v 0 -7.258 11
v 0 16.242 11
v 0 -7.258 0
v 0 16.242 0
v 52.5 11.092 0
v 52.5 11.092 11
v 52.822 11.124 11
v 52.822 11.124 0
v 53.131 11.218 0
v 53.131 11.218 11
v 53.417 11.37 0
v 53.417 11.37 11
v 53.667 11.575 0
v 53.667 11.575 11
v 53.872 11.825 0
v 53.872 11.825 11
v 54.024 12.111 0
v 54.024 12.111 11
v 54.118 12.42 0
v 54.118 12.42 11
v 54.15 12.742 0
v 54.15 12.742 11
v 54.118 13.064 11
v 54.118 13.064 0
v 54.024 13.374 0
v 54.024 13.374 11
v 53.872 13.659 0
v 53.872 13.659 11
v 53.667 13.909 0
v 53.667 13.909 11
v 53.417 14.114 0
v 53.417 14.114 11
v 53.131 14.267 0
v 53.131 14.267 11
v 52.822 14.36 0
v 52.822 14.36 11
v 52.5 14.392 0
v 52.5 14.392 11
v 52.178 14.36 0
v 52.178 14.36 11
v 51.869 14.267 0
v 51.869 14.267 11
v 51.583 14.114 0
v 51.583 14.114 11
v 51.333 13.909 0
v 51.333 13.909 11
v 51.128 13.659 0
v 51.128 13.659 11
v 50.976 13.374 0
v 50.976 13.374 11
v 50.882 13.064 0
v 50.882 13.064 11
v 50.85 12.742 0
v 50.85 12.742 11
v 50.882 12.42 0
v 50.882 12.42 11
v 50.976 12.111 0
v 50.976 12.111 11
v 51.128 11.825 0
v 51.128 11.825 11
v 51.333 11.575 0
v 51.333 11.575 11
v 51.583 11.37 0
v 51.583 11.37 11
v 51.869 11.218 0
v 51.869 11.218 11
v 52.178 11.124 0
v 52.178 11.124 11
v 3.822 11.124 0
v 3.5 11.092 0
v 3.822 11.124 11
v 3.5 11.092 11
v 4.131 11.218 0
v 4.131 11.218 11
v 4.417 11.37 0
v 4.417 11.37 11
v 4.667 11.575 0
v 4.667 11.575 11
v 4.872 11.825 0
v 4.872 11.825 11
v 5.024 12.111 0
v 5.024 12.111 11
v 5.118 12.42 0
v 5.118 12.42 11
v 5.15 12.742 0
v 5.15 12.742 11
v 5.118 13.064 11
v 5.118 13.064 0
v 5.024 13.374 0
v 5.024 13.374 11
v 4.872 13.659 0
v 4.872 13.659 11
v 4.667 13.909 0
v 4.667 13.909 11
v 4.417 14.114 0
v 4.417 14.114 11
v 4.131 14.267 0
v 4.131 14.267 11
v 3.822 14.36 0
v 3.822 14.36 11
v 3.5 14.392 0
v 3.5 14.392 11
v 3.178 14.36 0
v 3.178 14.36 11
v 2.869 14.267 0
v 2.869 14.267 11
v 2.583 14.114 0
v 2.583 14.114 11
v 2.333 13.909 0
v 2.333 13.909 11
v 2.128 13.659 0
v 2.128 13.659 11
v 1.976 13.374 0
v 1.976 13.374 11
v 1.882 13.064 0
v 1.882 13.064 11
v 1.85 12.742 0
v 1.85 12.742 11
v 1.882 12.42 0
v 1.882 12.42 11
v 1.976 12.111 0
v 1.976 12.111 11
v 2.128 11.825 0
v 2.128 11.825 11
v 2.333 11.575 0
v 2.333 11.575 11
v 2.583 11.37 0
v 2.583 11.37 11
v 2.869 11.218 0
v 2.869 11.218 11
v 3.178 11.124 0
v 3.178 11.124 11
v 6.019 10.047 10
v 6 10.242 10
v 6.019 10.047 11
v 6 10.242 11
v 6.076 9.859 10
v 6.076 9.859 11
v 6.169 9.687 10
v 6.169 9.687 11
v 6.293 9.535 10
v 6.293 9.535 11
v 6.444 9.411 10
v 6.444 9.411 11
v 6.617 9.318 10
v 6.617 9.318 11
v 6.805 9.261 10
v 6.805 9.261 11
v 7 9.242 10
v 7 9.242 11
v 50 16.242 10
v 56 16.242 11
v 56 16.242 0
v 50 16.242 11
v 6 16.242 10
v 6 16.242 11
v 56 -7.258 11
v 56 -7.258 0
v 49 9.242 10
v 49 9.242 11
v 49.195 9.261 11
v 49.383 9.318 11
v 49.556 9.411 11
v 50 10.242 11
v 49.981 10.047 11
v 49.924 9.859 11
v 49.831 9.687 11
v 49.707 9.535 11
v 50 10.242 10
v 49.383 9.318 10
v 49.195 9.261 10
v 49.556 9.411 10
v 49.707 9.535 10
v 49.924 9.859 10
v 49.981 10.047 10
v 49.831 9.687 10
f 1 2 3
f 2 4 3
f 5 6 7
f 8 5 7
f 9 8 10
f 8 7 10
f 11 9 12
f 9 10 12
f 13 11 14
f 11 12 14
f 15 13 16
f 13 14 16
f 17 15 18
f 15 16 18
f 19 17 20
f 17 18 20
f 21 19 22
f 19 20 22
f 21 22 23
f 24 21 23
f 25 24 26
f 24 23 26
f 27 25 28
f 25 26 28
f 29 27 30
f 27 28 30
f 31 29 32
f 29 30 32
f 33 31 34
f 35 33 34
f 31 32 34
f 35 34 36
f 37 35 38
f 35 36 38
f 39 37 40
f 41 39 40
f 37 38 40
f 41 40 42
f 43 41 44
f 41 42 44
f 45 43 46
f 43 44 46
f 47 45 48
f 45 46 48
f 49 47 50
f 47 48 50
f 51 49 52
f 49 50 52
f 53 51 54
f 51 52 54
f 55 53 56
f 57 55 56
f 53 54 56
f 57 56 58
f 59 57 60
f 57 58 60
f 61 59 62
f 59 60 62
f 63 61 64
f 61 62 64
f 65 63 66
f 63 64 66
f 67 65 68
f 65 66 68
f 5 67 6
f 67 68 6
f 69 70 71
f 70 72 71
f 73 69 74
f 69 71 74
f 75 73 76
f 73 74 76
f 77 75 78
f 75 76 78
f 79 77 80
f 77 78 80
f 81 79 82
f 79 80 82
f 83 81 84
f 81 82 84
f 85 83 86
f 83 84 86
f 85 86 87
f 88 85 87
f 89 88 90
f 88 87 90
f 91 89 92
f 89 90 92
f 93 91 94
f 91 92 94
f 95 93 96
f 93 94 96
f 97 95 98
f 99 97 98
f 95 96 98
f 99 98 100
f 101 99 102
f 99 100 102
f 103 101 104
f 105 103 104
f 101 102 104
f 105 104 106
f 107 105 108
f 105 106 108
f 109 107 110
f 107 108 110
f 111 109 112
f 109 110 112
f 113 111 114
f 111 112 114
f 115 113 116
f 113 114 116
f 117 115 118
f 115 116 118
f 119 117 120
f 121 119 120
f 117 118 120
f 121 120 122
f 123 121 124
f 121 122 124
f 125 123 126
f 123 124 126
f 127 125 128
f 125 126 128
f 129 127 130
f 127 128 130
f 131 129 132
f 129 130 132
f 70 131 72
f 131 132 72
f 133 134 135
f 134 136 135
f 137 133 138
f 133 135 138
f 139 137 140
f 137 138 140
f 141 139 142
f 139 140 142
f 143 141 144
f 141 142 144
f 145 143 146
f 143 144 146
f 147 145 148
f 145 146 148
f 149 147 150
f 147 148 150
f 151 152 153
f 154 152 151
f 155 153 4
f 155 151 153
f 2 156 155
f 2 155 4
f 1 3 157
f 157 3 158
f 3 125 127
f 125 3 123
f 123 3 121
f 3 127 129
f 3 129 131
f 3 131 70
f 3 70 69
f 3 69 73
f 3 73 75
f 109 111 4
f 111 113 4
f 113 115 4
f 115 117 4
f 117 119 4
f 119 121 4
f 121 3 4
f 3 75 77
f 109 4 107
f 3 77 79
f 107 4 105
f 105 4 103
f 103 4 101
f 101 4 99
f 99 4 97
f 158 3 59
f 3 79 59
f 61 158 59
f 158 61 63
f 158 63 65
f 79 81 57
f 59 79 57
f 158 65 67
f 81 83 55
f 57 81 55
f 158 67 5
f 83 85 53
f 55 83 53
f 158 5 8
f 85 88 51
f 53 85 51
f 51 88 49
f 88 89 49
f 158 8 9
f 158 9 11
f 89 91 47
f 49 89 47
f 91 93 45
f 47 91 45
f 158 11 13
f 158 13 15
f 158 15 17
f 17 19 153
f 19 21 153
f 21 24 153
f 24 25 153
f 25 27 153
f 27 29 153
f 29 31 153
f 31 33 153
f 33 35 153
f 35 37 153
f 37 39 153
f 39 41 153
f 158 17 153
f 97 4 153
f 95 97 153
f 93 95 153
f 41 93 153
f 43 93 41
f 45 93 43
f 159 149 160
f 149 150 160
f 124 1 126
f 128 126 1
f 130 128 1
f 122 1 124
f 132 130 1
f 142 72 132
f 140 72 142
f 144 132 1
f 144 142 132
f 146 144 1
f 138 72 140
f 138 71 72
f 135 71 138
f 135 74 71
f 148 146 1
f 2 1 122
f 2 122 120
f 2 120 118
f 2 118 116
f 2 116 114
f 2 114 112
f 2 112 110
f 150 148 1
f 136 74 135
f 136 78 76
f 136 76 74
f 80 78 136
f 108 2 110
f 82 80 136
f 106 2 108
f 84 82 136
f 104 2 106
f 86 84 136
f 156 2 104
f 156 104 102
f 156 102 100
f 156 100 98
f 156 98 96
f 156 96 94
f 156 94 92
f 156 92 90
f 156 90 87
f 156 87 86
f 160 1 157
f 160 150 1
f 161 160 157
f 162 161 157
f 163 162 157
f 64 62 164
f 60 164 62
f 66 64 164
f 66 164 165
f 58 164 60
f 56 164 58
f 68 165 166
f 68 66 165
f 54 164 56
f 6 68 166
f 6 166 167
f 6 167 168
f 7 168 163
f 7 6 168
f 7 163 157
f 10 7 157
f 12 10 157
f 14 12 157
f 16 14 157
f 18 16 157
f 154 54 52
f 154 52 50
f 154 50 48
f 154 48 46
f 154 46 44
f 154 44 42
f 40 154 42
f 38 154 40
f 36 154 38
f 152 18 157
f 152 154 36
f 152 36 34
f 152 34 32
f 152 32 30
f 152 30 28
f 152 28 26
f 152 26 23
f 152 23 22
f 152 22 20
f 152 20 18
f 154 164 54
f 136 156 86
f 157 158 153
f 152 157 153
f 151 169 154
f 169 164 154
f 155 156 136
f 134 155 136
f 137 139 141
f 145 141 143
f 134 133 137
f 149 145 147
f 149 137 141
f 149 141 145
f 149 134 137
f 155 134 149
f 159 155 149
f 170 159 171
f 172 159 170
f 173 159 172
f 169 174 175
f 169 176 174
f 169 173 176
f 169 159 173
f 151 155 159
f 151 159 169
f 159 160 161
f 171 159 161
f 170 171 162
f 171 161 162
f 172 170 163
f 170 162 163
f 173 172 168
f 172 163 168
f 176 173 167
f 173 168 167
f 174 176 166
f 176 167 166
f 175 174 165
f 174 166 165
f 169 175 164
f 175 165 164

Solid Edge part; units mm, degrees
sketch "Sketch1" plane through (0, 0, 0) normal (0, 0, 1) x (1, 0, 0)
  line L0 (0, -7.2579) -> (56, -7.2579)
  line L1 (56, -7.2579) -> (56, 17.2421)
  line L2 (56, 17.2421) -> (0, 17.2421)
  line L3 (0, 17.2421) -> (0, -7.2579)
  dimension "D1" = 56
  dimension "D2" = 24.5
extrude "Protrusion1" add sketch "Sketch1" along normal blind 11
hole "Hole_1" at (52.5, 12.7421, 11) direction (0, 0, -1) diameter 3.3 end through all
hole "Hole1" at (3.5, 12.7421, 11) direction (0, 0, -1) diameter 3.3 end through all
sketch "Sketch2" plane through (28, 4.9921, 11) normal (0, 0, 1) x (1, 0, 0)
  line L0 (-21, 4.25) -> (21, 4.25)
  arc A0 (22, 5.25) -> (21, 4.25) centre (21, 5.25) cw
  line L1 (22, 5.25) -> (22, 12.25)
  line L2 (22, 12.25) -> (-22, 12.25)
  line L3 (-22, 12.25) -> (-22, 5.25)
  arc A1 (-22, 5.25) -> (-21, 4.25) centre (-21, 5.25) ccw
  dimension "D1" = 44
  dimension "D2" = 7
  dimension "D3" = 1
  dimension "D4" = 1
extrude "ExtrudedCutout_1" cut sketch "Sketch2" against normal blind 1
sketch "Sketch3" plane through (28, 4.9921, 11) normal (0, 0, 1) x (1, 0, 0)
  line L0 (-28, 12.25) -> (28, 12.25)
  line L1 (28, 12.25) -> (28, 11.25)
  line L2 (28, 11.25) -> (-28, 11.25)
  line L3 (-28, 11.25) -> (-28, 12.25)
  dimension "D1" = 1
extrude "Cutout1" cut sketch "Sketch3" against normal through all
properties material "Aluminum, 6061-T6"
